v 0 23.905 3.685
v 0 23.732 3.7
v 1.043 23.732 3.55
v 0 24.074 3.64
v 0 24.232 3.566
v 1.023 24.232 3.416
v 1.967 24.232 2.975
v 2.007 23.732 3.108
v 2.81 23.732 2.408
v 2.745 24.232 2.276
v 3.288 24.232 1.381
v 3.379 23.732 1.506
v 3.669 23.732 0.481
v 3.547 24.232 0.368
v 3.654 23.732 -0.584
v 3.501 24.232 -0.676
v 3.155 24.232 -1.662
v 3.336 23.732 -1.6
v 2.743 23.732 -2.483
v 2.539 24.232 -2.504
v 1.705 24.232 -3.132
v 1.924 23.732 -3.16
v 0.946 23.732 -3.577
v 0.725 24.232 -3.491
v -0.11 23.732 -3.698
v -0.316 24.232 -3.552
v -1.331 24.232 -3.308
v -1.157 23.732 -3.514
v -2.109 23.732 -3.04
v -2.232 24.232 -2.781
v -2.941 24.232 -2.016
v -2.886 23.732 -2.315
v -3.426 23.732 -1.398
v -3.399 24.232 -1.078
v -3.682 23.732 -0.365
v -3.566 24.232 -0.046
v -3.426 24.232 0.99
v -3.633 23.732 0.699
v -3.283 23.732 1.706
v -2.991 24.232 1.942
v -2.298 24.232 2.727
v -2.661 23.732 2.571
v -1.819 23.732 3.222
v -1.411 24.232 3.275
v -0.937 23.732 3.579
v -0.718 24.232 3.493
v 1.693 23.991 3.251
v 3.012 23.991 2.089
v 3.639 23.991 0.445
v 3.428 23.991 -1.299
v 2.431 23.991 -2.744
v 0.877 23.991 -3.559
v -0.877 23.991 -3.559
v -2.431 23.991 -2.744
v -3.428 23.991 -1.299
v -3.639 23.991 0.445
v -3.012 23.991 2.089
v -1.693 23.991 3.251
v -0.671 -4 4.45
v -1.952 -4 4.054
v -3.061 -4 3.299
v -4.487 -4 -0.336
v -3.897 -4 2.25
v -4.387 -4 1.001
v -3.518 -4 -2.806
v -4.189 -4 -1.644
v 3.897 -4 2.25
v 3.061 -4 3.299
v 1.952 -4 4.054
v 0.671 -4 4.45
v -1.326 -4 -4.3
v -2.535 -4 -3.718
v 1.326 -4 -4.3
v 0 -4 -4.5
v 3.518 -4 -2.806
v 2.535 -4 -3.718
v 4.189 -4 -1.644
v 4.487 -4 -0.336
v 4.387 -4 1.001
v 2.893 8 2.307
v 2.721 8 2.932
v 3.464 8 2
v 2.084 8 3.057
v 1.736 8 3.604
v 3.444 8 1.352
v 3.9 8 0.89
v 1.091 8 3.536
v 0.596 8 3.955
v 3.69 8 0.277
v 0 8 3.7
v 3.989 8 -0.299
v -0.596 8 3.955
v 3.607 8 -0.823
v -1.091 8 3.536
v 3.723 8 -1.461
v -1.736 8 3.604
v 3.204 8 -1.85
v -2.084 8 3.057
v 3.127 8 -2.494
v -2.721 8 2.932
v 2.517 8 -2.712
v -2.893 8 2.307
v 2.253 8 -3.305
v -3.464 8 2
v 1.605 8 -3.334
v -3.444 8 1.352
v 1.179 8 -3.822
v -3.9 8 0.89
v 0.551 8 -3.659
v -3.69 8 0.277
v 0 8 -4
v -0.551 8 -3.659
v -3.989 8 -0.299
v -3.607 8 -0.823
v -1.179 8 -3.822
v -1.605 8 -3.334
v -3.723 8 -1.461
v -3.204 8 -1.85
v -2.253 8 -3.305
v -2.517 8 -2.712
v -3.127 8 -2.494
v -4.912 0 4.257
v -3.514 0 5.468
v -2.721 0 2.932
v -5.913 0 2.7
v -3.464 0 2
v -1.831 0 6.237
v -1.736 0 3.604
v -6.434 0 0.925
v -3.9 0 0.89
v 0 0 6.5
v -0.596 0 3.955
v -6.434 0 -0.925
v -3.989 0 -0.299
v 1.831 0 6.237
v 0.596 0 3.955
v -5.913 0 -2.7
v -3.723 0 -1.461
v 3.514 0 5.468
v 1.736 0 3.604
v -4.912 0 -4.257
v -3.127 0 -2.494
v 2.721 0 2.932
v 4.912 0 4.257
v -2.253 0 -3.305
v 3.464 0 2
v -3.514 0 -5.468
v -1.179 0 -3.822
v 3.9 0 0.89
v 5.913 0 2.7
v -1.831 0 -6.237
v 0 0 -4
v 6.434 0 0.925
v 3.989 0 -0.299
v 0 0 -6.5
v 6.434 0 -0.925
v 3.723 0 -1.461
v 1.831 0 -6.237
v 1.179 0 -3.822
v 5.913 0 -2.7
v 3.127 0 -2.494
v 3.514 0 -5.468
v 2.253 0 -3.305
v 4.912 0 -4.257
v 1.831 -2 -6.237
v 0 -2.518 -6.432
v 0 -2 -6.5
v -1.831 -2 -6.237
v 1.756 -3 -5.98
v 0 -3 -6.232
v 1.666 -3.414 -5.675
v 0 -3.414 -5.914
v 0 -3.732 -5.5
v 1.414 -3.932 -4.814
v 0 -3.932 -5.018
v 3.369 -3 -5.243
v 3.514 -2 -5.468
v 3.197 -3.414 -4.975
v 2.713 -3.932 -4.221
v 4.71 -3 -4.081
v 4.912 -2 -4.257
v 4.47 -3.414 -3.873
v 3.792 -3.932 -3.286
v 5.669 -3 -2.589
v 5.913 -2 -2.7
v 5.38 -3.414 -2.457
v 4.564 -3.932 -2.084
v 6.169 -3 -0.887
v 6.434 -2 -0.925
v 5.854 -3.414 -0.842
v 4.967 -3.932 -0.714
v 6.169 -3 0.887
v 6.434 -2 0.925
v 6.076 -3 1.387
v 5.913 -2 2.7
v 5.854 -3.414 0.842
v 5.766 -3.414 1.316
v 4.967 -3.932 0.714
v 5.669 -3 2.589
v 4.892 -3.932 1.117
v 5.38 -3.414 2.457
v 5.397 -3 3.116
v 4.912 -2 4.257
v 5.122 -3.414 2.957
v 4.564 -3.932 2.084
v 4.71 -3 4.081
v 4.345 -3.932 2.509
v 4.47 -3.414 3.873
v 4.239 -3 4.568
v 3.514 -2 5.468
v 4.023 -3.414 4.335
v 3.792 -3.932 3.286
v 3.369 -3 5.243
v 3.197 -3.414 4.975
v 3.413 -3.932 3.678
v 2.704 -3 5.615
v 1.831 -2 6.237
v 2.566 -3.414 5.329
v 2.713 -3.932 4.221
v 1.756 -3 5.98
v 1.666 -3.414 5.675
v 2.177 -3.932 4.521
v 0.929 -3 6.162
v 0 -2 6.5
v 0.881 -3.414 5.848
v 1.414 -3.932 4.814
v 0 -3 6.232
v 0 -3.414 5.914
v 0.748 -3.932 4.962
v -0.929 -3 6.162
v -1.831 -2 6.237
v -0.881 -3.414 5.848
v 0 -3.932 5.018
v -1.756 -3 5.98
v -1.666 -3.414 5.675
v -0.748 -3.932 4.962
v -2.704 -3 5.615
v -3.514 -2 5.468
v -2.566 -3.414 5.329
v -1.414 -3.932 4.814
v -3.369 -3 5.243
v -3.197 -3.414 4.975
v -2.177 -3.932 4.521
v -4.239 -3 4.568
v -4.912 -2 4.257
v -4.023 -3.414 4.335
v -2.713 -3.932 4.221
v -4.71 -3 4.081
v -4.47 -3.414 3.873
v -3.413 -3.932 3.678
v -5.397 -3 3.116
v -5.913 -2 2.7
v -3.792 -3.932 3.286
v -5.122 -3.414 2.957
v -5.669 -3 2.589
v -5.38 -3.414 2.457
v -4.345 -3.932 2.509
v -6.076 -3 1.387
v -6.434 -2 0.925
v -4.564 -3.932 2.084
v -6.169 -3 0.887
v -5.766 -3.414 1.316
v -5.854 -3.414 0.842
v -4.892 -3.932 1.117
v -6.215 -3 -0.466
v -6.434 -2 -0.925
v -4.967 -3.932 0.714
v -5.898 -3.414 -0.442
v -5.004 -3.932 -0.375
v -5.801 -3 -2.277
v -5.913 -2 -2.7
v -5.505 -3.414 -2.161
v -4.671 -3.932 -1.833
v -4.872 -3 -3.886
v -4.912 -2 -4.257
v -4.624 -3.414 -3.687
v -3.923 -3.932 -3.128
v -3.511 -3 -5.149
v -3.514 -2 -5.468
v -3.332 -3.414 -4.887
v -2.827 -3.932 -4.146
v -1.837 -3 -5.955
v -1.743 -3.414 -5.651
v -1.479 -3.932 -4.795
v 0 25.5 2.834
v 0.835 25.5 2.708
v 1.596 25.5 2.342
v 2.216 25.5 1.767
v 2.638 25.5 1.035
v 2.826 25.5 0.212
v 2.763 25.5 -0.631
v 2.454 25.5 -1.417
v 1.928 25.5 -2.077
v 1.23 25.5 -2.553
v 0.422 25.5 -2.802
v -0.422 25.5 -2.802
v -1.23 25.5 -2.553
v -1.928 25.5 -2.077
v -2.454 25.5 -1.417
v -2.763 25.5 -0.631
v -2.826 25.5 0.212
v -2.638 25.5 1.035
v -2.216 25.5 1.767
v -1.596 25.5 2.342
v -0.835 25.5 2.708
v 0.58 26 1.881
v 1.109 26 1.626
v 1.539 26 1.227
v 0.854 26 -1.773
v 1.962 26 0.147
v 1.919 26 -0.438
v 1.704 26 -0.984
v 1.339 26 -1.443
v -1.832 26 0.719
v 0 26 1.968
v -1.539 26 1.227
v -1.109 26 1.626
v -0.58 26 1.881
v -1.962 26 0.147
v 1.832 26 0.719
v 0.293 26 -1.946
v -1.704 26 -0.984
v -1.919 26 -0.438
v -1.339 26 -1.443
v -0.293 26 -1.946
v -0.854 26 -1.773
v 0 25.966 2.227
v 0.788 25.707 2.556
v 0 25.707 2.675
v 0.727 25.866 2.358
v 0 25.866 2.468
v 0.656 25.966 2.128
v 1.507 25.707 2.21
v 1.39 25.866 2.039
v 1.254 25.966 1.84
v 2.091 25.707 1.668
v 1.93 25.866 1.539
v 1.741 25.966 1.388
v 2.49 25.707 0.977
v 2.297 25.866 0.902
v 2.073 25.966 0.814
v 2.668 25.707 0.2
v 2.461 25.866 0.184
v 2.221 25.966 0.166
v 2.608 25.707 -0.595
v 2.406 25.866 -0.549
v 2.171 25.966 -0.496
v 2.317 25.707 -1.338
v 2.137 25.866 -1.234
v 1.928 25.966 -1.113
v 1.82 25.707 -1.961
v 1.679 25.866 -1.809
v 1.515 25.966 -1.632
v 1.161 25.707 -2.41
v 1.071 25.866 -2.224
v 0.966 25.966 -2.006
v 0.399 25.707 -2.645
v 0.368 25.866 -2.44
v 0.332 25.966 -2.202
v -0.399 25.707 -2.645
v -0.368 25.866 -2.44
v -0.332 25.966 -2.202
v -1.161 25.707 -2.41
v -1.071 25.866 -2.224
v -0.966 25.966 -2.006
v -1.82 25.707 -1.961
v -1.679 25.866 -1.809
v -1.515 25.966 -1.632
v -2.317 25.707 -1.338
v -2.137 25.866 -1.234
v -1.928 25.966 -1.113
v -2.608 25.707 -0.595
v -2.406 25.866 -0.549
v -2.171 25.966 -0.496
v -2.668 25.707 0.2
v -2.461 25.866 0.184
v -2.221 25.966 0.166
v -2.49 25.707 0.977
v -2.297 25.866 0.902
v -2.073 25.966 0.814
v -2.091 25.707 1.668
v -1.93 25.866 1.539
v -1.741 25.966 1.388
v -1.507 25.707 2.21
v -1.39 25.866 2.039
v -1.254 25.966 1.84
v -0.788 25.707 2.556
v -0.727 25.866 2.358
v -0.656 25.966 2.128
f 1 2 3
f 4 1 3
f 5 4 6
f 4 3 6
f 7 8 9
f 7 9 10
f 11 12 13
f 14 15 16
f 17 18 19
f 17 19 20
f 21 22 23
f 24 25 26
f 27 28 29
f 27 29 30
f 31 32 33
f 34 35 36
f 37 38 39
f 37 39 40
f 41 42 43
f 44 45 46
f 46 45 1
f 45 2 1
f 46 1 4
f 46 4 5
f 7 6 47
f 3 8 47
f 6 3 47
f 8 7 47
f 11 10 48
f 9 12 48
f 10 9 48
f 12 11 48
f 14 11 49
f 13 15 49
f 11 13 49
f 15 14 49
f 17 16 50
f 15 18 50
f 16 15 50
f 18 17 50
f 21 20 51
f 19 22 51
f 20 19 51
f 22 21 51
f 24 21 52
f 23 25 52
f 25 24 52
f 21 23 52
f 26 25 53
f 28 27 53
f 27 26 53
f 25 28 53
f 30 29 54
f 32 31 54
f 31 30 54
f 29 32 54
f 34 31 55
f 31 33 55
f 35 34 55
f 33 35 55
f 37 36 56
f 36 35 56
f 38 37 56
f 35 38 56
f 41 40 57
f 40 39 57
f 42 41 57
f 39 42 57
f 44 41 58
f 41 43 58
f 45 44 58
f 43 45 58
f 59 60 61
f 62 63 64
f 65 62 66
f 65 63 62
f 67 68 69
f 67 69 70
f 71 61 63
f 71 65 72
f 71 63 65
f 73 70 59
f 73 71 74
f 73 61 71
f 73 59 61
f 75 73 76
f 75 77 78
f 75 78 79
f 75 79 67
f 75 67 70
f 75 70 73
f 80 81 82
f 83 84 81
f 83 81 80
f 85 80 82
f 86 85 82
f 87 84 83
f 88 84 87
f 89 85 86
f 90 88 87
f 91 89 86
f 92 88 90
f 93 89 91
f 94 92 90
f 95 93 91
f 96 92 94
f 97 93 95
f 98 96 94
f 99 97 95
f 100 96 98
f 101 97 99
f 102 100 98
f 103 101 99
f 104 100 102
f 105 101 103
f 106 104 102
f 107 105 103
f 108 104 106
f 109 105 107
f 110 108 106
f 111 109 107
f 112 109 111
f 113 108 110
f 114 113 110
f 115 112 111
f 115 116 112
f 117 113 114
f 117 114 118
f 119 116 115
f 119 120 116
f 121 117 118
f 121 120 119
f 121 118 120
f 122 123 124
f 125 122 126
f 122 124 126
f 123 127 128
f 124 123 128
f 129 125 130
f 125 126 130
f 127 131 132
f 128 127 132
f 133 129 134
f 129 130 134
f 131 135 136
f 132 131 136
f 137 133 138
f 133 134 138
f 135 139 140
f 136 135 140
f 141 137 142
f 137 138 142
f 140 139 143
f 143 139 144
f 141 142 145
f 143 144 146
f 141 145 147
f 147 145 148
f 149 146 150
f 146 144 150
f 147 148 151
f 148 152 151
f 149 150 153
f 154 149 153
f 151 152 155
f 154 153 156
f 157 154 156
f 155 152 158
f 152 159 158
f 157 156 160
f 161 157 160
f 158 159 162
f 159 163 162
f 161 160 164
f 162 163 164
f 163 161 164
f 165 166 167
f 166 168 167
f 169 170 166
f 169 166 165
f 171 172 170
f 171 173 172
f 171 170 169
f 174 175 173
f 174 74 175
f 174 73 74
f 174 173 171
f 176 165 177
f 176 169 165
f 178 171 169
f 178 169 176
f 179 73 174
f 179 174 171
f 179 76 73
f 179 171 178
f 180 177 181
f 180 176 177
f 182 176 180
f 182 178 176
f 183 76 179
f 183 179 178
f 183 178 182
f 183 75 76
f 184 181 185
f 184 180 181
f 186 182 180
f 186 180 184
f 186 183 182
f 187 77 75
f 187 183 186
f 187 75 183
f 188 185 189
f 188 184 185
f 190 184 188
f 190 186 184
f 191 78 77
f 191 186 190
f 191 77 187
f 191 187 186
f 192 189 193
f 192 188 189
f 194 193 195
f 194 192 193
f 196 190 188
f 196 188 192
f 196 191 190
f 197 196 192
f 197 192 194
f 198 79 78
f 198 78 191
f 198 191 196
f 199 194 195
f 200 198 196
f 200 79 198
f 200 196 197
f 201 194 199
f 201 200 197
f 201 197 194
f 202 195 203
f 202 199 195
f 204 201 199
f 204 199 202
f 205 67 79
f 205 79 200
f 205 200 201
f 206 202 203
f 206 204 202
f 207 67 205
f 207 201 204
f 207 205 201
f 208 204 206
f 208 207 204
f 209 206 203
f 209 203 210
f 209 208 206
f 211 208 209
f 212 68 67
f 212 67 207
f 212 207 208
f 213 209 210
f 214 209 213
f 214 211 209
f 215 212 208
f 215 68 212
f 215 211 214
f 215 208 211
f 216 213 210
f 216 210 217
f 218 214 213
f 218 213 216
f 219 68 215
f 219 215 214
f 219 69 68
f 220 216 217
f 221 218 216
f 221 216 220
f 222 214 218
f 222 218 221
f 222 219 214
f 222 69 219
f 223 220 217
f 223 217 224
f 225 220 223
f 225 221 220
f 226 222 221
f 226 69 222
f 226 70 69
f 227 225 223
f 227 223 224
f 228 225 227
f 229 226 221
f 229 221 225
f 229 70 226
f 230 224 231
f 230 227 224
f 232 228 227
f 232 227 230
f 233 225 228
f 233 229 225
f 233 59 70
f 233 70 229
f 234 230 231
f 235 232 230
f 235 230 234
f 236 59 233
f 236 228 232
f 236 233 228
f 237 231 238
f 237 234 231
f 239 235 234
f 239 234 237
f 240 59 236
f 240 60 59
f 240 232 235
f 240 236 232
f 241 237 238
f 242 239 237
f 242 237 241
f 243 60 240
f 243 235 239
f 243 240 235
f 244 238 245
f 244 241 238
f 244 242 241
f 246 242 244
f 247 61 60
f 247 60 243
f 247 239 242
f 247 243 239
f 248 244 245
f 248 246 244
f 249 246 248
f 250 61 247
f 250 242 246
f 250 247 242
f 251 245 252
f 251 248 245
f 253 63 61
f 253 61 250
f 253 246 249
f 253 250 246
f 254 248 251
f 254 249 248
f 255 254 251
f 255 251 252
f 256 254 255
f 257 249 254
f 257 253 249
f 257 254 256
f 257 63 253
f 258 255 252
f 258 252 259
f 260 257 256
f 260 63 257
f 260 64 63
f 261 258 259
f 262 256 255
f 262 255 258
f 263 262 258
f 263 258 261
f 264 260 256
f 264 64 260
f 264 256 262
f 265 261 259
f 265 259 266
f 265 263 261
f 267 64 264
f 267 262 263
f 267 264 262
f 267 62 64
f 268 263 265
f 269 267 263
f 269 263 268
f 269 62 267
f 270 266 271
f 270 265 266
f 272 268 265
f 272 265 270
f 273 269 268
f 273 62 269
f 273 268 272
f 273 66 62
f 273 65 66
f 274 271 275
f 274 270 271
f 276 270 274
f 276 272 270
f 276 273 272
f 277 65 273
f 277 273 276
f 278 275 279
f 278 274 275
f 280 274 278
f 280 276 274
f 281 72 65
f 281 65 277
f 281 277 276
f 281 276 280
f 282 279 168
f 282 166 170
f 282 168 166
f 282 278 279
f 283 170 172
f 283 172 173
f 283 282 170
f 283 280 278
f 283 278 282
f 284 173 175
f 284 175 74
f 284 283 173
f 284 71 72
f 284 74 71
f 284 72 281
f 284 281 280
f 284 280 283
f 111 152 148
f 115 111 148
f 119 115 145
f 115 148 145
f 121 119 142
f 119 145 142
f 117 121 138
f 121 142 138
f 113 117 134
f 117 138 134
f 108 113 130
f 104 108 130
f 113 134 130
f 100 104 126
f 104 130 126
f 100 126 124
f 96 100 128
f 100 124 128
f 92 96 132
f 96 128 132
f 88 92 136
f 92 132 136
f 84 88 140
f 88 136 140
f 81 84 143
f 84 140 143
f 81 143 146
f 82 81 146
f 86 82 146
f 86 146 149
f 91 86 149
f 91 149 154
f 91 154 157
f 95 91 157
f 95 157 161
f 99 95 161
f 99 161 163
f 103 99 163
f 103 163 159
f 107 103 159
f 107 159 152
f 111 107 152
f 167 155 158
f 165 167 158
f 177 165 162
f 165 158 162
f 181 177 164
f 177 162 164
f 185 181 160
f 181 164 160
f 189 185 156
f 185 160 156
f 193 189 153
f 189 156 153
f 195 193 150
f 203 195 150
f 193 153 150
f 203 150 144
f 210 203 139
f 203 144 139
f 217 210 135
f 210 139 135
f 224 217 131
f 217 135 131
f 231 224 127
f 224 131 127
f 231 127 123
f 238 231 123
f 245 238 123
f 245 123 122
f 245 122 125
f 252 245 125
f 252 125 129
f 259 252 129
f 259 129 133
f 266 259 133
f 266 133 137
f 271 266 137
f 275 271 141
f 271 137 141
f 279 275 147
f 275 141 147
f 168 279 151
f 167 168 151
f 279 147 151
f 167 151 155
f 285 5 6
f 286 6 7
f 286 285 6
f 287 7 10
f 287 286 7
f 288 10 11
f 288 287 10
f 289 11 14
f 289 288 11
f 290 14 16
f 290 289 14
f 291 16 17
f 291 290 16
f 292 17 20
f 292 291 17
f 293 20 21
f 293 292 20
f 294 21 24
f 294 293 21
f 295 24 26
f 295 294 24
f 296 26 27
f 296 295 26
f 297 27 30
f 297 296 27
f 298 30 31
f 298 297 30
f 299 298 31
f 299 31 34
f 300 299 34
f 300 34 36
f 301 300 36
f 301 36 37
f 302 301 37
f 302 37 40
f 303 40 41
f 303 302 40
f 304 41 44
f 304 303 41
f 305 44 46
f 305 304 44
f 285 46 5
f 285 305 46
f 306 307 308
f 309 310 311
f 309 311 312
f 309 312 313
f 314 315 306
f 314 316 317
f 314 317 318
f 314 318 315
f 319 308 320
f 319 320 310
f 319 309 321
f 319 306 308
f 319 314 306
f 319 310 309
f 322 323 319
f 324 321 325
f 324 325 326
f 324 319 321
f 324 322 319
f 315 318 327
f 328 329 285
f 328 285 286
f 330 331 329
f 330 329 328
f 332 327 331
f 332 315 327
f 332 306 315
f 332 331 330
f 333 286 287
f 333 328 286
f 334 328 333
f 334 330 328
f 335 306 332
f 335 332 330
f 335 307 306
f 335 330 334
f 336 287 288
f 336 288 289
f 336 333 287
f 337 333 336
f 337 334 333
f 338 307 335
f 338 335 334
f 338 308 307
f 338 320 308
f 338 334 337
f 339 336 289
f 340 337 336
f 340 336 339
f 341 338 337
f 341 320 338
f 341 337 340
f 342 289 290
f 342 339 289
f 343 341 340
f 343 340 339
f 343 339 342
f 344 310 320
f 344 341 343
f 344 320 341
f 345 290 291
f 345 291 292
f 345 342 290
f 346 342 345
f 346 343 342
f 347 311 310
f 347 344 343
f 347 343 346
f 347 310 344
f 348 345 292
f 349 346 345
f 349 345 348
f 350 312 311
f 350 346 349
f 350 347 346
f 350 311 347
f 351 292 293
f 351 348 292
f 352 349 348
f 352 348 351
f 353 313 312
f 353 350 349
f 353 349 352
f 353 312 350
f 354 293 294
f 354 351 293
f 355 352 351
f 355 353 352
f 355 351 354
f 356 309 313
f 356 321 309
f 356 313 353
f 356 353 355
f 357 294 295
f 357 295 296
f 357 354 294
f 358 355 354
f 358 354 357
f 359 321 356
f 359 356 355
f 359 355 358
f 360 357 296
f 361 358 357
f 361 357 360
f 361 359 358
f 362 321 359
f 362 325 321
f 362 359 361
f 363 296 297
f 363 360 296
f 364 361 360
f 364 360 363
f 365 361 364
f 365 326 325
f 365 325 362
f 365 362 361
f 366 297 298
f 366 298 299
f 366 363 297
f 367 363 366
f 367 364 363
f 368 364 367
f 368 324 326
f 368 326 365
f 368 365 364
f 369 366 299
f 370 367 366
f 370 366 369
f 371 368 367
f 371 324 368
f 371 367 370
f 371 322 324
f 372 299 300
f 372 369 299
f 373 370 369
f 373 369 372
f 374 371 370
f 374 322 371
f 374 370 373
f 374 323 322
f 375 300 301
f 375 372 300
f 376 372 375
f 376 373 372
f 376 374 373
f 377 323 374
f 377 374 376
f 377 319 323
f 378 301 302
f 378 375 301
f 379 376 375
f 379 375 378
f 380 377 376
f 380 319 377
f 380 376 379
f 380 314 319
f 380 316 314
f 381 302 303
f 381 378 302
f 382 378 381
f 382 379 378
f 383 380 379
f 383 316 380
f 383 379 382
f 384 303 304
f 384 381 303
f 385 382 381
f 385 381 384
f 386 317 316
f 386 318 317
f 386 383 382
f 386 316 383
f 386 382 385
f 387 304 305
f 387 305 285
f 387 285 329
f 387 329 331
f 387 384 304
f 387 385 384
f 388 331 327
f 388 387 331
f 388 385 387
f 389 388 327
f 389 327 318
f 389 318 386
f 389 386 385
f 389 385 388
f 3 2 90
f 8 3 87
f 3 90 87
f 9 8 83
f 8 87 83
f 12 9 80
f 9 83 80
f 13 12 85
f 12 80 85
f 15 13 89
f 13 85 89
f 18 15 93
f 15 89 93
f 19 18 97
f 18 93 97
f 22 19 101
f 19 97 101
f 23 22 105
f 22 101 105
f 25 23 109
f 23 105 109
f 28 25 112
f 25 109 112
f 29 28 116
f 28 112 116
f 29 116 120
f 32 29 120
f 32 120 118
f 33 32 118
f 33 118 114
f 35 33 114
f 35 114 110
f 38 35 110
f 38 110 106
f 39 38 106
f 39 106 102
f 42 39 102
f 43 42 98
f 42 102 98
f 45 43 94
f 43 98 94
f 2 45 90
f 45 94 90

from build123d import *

# Parameters (mm, degrees)
SKETCH1_R           = 4
BOSS_EXTRUDE1_DEPTH = 26
SKETCH2_R           = 6.5
BOSS_EXTRUDE2_DEPTH = 4
CUT_EXTRUDE1_START  = -18
SKETCH3_R           = 4
SKETCH3_R_2         = 3.7
CUT_EXTRUDE1_DEPTH  = 18
FILLET2_R           = 2
CHAMFER1_SIZE       = 2
CHAMFER1_SIZE2      = 1.154700538
FILLET3_R           = 1


with BuildPart() as part:
    # Sketch1 → Boss-Extrude1 (new body)
    with BuildSketch(Plane(origin=(0, 0, 0), x_dir=(1, 0, 0), z_dir=(0, 1, 0))):
        with Locations(Location((0, 0, 0), (0, 0, 90))):
            Circle(SKETCH1_R)
    extrude(amount=BOSS_EXTRUDE1_DEPTH)

    # Sketch2 → Boss-Extrude2 (add)
    with BuildSketch(Plane.XZ):
        with Locations(Location((0, 0, 0), (0, 0, 270))):
            Circle(SKETCH2_R)
    extrude(amount=BOSS_EXTRUDE2_DEPTH)

    # Sketch3 → Cut-Extrude1 (cut)
    with BuildSketch(Plane(origin=(0, 26, 0), x_dir=(1, 0, 0), z_dir=(0, 1, 0)).offset(CUT_EXTRUDE1_START)):
        with Locations(Location((0, 0, 0), (0, 0, 90))):
            Circle(SKETCH3_R)
        with Locations(Location((0, 0, 0), (0, 0, 270))):
            Circle(SKETCH3_R_2, mode=Mode.SUBTRACT)
    extrude(amount=CUT_EXTRUDE1_DEPTH, mode=Mode.SUBTRACT)

    # Fillet2
    fillet2_edges = [part.edges().sort_by_distance(p)[0] for p in [
        (0, -4, 6.5),
    ]]
    fillet(fillet2_edges, radius=FILLET2_R)

    # Chamfer1
    chamfer1_edges = [part.edges().sort_by_distance(p)[0] for p in [
        (0, 26, -3.7),
    ]]
    chamfer1_side = [part.faces().sort_by_distance(p)[0] for p in [
        (0, 17, -3.7),
    ]]
    chamfer(chamfer1_edges, length=CHAMFER1_SIZE, length2=CHAMFER1_SIZE2, reference=chamfer1_side[0])

    # Fillet3
    fillet3_edges = [part.edges().sort_by_distance(p)[0] for p in [
        (0, 26, -2.545299462),
        (0, 24, -3.7),
    ]]
    fillet(fillet3_edges, radius=FILLET3_R)


solid = part.part
